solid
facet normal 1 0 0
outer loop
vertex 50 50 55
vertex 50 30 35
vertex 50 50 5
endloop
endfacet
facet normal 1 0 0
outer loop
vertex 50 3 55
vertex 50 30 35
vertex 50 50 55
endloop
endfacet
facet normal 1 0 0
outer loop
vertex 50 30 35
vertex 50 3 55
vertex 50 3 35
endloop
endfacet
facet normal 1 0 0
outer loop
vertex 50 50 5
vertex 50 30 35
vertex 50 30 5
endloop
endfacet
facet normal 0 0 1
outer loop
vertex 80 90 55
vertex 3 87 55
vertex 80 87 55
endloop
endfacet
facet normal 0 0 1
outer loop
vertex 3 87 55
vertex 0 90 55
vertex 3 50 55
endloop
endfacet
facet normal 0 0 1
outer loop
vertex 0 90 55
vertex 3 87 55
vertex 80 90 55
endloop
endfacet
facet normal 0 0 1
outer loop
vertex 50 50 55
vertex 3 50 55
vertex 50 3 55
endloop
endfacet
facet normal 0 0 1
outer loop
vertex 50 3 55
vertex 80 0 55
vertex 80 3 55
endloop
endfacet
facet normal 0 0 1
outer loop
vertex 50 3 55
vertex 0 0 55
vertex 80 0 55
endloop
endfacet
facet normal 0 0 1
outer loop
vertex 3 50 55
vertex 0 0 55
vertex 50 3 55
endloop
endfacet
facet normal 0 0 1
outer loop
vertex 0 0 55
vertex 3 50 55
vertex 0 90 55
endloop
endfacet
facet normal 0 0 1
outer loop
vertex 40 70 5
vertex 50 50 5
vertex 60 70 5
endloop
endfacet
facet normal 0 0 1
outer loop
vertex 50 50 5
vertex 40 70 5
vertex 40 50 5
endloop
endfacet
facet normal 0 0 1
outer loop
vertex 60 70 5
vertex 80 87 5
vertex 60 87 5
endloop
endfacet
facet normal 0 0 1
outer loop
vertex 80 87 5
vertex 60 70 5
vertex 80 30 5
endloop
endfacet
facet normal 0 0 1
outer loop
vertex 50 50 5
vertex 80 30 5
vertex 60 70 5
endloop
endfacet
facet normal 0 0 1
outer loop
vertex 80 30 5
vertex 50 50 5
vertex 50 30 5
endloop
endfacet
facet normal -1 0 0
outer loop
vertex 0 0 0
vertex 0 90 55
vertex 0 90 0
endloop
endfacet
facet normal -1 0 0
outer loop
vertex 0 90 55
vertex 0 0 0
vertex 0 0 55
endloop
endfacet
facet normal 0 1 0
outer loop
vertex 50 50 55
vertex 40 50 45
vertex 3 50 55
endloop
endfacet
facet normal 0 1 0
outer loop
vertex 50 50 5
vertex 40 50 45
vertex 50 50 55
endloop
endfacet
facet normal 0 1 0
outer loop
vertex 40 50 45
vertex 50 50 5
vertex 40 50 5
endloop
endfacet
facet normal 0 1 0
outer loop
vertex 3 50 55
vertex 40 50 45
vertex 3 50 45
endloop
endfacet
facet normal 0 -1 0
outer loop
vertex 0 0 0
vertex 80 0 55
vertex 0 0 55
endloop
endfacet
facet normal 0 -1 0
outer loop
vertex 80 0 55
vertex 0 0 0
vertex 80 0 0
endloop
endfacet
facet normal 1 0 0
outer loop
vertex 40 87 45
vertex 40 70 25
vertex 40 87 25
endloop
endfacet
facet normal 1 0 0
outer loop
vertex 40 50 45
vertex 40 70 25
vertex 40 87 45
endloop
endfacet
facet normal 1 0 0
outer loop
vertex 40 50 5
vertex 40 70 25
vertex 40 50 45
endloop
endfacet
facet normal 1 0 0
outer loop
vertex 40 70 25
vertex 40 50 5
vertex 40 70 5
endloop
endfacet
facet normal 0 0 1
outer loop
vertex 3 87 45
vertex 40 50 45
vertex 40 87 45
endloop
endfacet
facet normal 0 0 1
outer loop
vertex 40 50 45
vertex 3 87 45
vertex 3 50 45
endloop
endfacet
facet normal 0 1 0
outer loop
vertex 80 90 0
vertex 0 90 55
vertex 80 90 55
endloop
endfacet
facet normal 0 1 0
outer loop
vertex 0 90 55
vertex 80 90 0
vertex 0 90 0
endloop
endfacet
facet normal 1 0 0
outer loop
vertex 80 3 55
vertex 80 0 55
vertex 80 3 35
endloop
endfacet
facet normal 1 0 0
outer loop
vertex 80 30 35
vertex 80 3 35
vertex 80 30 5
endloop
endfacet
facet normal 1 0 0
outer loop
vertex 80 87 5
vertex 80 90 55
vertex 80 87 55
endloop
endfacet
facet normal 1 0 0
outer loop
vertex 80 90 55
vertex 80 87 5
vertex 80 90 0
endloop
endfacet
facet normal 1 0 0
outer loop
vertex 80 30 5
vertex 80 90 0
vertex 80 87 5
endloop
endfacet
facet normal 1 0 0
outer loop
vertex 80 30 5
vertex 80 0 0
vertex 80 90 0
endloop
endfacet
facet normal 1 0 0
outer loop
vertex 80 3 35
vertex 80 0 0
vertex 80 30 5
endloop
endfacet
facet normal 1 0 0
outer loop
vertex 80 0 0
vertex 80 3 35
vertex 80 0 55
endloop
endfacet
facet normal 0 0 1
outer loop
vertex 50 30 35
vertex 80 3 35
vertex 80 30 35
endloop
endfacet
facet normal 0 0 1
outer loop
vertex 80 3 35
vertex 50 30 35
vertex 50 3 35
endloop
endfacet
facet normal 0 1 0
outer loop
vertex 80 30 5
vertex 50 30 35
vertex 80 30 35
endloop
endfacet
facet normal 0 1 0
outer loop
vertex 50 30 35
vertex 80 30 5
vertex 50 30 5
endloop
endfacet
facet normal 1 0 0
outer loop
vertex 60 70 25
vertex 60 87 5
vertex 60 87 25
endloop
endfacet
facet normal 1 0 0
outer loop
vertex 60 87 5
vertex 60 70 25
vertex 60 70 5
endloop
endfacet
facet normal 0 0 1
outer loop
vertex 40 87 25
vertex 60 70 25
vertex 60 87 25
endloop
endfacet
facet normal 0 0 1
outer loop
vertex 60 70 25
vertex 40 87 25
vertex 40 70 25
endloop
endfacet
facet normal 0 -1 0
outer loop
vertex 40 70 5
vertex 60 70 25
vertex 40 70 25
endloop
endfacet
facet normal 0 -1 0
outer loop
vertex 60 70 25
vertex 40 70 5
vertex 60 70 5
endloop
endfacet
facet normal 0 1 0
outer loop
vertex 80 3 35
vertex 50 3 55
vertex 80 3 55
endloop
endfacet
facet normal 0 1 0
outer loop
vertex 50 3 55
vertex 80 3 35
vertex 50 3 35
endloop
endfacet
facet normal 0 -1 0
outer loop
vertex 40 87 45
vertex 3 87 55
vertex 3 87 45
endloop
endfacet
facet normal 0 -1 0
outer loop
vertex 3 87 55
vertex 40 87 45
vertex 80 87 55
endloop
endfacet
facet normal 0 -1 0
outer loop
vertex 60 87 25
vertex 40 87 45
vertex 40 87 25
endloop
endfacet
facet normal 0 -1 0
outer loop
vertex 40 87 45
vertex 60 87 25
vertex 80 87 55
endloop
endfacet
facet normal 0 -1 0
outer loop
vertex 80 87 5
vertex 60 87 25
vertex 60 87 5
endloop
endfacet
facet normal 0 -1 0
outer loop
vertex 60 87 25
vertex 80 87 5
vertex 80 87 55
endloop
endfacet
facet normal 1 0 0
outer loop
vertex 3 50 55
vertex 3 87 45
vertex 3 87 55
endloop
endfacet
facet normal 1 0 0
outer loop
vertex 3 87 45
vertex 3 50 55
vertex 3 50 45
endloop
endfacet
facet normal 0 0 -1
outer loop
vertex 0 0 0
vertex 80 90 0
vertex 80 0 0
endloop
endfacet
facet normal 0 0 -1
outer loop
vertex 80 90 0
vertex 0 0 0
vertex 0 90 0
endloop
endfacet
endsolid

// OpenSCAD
//4 Block Showcase

//Cube 1 Width
Cube1Width = 50;

//Cube 1 Length
Cube1Length = 50;

//Cube 1 Height
Cube1Height = 50;


//Cube 2 Width
Cube2Width = 40;

//Cube 2 Length
Cube2Length = 40;

//Cube 2 Height
Cube2Height = 40;


//Cube 3 Width
Cube3Width = 30;

//Cube 3 Length
Cube3Length = 30;

//Cube 3 Height
Cube3Height = 30;


//Cube 4 Width
Cube4Width = 20;

//Cube 4 Length
Cube4Length = 20;

//Cube 4 Height
Cube4Height = 20;


//Bottom Thickness
BottomThickness = 5;

//Length Of Wall
LengthOfWall = 3;

//4 Cubes
translate([0,0,BottomThickness]){
    //Cube 1
    color("red")
    cube([Cube1Width,Cube1Length,Cube1Height]);

    //Cube 2
    color("orange")
    translate([0,Cube1Length,0]){
        cube([Cube2Width,Cube2Length,Cube2Height]);
    }

    //Cube 3
    color("yellow")
    translate([Cube1Width,0,0]){
        cube([Cube3Width,Cube3Length,Cube3Height]);
    }
    
    //Cube 4
    color("green")
    translate([Cube2Width,(Cube1Length+Cube2Length)-Cube4Length,0]){
        cube([Cube4Width,Cube4Length,Cube4Height]);
    }
    
    //Wall 1
    color("blue")
    translate([Cube1Width,0,Cube3Height]){
        cube([Cube3Width,LengthOfWall,Cube1Height-Cube3Height]);
    }
    
    //Wall 2
    color("purple")
    translate([Cube2Width,(Cube1Length+Cube2Length)-LengthOfWall,Cube4Height]){
        cube([Cube4Width,LengthOfWall,Cube2Height-Cube4Height]);
    }
    
    //Wall 3
    color("pink")
    translate([0,Cube1Length,Cube2Height]){
        cube([LengthOfWall,Cube2Length,Cube1Height-Cube2Height]);
    }
    
    //Wall 4
    color("gold")
    translate([LengthOfWall,(Cube1Length+Cube2Length)-LengthOfWall,Cube2Height]){
        cube([(Cube1Width+Cube3Width)-LengthOfWall,LengthOfWall,Cube1Height-Cube2Height]);
    }
    
    //Wall 5
    color("saddlebrown")
    translate([Cube2Width+Cube4Width,(Cube1Length+Cube2Length)-LengthOfWall,0]){
        cube([(Cube1Width+Cube3Width)-(Cube2Width+Cube4Width),LengthOfWall,Cube2Height]);
    }
}

//Base
    color("grey")
    cube([Cube1Width+Cube3Width,Cube1Length+Cube2Length,BottomThickness]);
